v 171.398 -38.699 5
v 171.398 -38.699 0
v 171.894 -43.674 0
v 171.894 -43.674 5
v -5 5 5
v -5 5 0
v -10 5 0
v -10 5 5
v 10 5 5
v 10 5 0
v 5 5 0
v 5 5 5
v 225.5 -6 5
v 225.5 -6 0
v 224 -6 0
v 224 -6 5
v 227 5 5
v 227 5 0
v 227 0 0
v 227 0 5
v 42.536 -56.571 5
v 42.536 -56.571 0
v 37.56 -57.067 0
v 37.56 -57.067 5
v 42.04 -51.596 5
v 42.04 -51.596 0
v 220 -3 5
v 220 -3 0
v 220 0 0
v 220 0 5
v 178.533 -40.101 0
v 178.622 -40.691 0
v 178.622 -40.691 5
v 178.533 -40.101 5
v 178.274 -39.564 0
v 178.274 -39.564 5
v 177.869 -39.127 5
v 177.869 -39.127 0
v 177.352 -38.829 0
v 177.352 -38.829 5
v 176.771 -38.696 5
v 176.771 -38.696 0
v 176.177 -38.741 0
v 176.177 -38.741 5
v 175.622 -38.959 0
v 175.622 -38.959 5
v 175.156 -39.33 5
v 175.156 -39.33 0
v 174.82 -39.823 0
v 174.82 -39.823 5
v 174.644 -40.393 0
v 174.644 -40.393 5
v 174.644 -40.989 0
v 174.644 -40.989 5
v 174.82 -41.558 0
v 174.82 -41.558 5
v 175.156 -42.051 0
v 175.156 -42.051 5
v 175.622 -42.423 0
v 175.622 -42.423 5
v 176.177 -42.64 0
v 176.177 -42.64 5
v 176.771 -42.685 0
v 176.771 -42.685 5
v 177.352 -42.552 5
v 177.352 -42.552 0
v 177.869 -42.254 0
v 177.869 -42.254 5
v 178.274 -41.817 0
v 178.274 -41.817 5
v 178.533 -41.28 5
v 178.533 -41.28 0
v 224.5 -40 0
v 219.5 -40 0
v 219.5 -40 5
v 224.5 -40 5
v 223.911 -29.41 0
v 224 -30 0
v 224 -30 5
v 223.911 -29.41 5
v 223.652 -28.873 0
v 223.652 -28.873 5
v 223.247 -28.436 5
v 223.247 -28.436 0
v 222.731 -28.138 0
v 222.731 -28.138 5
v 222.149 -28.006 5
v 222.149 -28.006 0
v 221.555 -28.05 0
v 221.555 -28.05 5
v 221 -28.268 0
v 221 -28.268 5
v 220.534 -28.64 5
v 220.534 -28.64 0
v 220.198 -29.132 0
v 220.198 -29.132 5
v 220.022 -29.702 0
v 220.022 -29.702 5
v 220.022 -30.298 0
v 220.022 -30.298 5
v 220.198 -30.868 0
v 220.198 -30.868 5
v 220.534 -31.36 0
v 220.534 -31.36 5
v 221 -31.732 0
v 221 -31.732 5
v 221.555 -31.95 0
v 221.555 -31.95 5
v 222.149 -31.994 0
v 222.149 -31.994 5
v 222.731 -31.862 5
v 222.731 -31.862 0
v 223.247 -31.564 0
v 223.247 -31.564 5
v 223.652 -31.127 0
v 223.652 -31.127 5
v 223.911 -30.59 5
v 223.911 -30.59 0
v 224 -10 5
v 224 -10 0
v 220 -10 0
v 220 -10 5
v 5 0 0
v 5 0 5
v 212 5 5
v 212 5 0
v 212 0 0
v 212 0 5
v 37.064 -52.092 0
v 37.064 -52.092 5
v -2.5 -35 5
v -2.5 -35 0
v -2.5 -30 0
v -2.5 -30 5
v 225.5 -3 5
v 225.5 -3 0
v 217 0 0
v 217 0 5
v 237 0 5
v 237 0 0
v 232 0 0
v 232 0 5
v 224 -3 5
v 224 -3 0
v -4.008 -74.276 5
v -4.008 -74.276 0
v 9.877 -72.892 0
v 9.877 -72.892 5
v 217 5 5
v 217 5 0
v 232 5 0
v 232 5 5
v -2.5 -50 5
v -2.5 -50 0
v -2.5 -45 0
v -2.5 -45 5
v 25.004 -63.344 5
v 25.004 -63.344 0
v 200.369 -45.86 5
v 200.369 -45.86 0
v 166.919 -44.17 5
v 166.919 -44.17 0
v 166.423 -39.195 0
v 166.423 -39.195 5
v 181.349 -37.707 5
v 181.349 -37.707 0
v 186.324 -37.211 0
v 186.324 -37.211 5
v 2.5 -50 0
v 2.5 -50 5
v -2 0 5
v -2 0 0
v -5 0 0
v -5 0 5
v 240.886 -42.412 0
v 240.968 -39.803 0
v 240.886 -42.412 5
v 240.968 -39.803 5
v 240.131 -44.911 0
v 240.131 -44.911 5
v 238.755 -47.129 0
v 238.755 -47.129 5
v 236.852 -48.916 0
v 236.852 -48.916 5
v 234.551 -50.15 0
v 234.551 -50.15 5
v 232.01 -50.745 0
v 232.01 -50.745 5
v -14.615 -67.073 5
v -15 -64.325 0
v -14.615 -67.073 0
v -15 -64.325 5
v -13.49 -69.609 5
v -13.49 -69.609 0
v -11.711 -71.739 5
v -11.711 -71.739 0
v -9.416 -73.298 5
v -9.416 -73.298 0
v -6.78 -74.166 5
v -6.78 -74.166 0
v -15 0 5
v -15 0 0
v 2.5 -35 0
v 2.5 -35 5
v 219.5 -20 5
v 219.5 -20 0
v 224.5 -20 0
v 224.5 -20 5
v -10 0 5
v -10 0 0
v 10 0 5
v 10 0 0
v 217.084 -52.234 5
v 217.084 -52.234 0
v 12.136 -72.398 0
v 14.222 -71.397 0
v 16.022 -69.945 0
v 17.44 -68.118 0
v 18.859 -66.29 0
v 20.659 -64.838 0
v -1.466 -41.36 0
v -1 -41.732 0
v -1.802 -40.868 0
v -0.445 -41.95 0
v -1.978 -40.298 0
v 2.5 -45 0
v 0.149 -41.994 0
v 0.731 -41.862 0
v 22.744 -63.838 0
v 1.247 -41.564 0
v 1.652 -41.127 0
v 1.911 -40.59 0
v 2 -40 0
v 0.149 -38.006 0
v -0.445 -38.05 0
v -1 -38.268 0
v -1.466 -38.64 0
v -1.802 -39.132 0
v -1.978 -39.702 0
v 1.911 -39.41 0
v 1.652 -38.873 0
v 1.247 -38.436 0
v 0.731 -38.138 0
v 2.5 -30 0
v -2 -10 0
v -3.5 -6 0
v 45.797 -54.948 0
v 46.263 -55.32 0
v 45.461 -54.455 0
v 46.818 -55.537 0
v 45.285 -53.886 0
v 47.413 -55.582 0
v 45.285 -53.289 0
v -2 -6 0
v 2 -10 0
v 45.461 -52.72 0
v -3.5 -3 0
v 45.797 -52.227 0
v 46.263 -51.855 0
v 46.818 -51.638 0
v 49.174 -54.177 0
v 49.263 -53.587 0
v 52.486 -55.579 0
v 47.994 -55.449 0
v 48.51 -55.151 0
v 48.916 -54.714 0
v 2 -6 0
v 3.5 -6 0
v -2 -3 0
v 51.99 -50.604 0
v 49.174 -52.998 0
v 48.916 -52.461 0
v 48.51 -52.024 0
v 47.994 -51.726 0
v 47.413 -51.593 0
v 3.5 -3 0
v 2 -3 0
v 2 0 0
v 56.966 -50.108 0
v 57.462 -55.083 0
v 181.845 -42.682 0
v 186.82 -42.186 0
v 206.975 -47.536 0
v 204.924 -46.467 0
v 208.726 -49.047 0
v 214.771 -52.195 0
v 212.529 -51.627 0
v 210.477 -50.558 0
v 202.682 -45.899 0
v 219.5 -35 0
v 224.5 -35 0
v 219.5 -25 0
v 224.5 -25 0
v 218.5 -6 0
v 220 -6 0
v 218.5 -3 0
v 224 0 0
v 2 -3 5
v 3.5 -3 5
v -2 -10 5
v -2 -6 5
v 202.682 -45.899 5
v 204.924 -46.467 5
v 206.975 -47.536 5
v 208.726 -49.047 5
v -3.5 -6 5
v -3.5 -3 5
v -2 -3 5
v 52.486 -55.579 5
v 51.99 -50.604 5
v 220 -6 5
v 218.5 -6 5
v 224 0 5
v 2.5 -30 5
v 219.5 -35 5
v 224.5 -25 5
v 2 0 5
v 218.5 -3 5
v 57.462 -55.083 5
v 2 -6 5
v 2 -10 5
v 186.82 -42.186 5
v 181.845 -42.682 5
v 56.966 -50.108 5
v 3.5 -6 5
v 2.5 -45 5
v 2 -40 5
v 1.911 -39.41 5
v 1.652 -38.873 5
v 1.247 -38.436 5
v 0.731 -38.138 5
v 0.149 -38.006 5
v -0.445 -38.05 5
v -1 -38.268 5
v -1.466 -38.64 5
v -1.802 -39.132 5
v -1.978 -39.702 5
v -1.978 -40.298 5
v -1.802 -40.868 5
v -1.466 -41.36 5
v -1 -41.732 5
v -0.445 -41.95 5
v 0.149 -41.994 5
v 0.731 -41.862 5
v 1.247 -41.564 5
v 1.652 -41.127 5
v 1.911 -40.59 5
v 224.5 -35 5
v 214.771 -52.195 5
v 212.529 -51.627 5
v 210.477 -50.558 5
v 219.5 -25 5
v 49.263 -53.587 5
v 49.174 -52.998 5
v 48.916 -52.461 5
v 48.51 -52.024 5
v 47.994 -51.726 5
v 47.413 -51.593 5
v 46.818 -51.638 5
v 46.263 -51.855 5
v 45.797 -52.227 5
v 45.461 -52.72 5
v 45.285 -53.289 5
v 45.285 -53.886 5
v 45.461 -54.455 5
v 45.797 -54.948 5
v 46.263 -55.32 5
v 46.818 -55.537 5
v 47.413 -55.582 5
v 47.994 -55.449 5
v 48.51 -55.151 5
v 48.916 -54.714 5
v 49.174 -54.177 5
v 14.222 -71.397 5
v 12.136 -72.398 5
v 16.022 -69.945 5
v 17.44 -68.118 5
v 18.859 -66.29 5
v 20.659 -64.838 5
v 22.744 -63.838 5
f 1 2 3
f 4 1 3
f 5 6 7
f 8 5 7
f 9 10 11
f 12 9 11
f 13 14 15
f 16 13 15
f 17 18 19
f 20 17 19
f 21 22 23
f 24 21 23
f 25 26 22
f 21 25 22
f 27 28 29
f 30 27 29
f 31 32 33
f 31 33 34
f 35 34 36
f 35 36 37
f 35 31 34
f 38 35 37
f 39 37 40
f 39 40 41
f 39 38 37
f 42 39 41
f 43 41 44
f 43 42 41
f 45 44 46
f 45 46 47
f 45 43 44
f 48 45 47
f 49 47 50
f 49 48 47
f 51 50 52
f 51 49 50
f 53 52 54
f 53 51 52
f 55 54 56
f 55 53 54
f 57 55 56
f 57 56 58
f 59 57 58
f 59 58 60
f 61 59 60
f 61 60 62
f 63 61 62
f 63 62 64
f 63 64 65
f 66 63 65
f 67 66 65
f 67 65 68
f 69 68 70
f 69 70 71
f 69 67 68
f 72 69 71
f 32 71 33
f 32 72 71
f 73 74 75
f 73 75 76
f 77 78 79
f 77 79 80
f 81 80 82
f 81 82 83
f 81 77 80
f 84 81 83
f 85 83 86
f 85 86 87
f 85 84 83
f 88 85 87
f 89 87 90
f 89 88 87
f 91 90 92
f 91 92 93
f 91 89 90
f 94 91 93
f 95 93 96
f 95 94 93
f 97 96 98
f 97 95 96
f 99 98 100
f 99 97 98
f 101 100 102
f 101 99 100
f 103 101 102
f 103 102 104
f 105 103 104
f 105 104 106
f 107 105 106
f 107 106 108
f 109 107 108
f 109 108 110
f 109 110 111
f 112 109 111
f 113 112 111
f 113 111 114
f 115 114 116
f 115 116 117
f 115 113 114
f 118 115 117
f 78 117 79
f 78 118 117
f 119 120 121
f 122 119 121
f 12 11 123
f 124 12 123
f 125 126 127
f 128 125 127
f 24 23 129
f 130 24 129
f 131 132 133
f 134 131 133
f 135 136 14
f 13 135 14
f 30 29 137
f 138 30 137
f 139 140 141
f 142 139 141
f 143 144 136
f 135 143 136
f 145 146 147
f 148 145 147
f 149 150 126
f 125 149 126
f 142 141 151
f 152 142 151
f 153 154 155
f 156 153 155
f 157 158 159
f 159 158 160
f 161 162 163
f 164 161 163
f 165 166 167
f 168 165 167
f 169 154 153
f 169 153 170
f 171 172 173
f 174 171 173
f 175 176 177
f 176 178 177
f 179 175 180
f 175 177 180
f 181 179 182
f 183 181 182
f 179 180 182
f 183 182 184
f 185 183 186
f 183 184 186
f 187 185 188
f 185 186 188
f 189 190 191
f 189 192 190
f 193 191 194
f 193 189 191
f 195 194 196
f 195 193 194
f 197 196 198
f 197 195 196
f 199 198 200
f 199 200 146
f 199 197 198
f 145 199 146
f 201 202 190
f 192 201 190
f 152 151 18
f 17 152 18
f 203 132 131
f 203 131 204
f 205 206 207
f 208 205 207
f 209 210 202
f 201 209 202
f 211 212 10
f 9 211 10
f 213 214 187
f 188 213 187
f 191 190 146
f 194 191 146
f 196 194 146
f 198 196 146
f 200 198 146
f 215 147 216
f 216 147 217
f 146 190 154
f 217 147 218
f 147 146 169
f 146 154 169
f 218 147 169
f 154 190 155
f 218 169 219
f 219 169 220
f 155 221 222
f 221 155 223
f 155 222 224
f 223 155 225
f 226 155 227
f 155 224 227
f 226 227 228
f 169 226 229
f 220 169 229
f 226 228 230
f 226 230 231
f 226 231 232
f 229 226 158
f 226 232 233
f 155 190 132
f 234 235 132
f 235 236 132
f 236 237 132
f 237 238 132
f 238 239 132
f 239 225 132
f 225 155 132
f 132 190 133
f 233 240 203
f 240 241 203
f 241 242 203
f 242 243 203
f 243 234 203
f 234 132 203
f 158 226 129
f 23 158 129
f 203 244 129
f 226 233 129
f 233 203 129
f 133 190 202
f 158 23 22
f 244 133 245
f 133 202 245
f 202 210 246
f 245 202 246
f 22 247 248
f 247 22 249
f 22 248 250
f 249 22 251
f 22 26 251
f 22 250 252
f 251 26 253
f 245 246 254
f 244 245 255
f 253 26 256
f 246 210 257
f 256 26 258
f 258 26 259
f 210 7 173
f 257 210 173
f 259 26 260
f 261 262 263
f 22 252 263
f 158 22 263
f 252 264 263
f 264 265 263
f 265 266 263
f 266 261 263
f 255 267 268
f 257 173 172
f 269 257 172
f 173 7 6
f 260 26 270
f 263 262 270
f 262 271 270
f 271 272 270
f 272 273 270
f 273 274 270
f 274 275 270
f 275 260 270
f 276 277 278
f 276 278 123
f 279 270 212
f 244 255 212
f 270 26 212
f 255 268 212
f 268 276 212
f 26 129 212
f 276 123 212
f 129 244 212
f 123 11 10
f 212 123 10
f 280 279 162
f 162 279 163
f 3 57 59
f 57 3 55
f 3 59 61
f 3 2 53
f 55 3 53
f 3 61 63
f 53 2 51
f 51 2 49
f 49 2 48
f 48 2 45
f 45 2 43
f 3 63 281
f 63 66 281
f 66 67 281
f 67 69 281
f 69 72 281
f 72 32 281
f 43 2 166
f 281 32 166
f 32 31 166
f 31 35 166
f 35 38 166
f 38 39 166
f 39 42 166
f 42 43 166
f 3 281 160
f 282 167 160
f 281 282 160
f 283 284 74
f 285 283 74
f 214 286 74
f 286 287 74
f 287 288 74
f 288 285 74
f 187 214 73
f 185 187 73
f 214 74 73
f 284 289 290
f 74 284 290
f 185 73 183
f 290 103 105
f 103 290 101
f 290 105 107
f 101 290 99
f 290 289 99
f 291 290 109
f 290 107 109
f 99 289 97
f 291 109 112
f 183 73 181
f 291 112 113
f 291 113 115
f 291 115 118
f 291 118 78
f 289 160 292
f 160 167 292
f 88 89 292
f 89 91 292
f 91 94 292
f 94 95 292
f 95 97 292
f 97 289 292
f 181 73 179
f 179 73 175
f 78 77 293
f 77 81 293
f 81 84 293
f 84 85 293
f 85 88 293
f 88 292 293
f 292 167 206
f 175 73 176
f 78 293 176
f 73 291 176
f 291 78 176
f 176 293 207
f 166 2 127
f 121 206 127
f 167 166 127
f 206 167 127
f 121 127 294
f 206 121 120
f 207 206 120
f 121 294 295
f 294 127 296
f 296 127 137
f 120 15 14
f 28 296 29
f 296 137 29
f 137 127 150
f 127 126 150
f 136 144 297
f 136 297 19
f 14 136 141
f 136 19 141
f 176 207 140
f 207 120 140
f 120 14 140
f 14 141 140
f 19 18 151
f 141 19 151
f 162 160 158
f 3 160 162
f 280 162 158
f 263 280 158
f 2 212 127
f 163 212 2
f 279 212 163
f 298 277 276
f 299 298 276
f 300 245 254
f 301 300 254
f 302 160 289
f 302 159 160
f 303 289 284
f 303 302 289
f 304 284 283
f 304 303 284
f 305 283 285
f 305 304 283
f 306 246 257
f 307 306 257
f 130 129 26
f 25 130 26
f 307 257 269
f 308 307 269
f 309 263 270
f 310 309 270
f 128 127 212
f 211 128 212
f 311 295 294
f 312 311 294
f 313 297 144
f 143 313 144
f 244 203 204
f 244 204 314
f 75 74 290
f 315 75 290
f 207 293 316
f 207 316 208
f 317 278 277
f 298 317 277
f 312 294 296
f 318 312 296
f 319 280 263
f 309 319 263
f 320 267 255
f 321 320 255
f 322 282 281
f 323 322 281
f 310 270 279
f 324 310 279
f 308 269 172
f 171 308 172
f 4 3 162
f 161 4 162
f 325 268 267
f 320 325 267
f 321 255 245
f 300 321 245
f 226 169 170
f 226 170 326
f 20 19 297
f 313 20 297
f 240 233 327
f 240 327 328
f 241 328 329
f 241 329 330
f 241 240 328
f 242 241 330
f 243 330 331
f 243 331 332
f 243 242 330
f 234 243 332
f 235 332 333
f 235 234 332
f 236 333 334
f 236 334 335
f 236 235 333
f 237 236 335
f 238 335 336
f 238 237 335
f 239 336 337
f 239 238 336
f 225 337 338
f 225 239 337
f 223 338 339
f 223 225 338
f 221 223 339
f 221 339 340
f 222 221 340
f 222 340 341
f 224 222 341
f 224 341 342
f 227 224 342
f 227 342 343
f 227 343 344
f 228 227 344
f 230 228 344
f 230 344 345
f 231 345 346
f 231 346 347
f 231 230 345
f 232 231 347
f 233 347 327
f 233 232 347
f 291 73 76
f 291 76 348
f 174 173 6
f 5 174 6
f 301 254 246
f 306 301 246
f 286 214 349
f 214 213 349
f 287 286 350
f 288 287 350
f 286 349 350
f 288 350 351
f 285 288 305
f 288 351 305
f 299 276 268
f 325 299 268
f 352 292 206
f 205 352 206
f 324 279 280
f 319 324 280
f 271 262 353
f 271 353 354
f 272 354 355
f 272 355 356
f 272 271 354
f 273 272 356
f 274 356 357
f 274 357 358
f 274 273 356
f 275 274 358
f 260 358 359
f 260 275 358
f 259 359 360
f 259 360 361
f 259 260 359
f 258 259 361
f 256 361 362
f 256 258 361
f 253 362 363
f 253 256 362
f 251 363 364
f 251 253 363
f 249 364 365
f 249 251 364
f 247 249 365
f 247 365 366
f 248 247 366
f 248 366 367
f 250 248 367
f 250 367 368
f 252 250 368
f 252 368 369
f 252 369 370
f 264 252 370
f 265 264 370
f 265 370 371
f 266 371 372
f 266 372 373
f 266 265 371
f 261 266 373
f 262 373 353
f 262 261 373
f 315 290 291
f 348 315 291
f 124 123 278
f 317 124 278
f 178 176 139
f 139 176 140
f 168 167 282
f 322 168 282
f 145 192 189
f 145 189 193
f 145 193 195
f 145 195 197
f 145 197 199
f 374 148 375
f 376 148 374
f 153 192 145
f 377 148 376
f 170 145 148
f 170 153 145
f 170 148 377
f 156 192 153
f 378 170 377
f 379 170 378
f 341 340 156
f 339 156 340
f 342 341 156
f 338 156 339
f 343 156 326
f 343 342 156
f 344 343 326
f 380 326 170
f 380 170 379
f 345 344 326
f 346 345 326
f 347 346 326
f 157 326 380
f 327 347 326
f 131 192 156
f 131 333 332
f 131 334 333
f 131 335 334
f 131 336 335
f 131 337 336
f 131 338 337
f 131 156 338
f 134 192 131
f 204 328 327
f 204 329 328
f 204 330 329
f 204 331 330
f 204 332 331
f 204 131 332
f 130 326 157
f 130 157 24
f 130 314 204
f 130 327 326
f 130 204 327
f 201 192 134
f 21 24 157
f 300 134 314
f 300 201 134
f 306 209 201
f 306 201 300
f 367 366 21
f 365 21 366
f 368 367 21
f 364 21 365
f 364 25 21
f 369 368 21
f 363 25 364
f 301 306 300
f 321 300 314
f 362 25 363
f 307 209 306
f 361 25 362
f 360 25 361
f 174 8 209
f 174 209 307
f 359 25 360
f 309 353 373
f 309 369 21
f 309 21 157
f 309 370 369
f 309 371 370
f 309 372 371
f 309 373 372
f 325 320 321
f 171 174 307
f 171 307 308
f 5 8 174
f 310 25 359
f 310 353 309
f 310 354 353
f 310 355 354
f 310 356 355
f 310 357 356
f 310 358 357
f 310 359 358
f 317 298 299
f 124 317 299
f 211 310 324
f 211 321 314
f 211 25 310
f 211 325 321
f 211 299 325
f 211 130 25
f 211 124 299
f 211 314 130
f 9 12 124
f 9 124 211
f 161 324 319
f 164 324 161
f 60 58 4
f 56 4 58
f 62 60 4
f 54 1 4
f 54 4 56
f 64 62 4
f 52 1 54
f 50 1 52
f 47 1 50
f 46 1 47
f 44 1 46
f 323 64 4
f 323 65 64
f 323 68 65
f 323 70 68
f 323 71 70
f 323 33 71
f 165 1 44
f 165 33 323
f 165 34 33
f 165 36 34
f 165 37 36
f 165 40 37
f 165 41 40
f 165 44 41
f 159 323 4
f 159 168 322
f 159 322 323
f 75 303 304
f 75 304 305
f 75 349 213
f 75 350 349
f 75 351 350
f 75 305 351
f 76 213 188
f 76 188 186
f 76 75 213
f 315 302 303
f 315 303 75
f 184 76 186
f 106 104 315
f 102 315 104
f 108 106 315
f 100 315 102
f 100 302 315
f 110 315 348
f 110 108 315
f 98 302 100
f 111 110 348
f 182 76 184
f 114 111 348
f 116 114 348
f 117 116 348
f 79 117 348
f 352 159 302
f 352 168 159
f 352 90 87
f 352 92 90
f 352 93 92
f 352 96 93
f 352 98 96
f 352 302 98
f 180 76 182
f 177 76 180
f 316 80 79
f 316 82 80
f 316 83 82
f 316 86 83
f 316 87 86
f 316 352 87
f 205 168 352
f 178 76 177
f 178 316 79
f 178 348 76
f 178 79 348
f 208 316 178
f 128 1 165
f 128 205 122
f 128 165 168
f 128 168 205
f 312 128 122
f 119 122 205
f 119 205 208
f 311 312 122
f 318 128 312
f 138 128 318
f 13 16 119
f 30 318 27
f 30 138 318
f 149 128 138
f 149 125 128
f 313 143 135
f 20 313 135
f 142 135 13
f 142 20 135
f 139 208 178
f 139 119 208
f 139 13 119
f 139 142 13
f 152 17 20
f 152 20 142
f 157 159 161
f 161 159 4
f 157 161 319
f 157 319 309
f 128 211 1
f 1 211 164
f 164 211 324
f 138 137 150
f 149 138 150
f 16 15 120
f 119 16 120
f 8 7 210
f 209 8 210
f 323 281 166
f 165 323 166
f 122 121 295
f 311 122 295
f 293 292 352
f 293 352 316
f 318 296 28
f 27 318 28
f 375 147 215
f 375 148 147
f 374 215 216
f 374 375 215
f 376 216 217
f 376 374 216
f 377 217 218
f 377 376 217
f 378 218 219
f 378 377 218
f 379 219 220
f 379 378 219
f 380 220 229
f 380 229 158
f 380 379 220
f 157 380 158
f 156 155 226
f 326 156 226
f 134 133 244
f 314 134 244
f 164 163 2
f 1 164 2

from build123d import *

# Parameters (mm, degrees)
ESQUISSE1_W        = 5
ESQUISSE1_H        = 5
ESQUISSE1_R        = 2
BOSS_EXTRU_1_DEPTH = 5
CONG_1_R           = 10


with BuildPart() as part:
    # Esquisse1 → Boss.-Extru.1 (new body)
    with BuildSketch(Plane.XY):
        Polygon((15, 0), (10, 0), (10, 5), (5, 5), (5, 0), (2, 0), (2, -3), (3.5, -3), (3.5, -6), (2, -6), (2, -10), (-2, -10), (-2, -6), (-3.5, -6), (-3.5, -3), (-2, -3), (-2, 0), (-5, 0), (-5, 5), (-10, 5), (-10, 0), (-15, 0), (-15, -75.371818049), (14.852006469, -72.395627572), (20.02875697, -63.839854419), (205.344258903, -45.364237629), (212.108310991, -52.729534592), (241.96031746, -49.753344116), (237, 0), (232, 0), (232, 5), (227, 5), (227, 0), (224, 0), (224, -3), (225.5, -3), (225.5, -6), (224, -6), (224, -10), (220, -10), (220, -6), (218.5, -6), (218.5, -3), (220, -3), (220, 0), (217, 0), (217, 5), (212, 5), (212, 0), (207, 0), align=None)
        with Locations((0, -47.5)):
            Rectangle(ESQUISSE1_W, ESQUISSE1_H, mode=Mode.SUBTRACT)
        Polygon((42.039762682, -51.595821645), (42.535794429, -56.571156057), (37.560460017, -57.067187803), (37.064428271, -52.091853391), align=None, mode=Mode.SUBTRACT)
        with Locations((47.263112967, -53.587457105)):
            Circle(ESQUISSE1_R, mode=Mode.SUBTRACT)
        with Locations((0, -40)):
            Circle(ESQUISSE1_R, mode=Mode.SUBTRACT)
        Polygon((57.461797663, -55.083060818), (52.486463252, -55.579092564), (51.990431506, -50.603758153), (56.965765917, -50.107726407), align=None, mode=Mode.SUBTRACT)
        Polygon((171.398457383, -38.698996248), (171.894489129, -43.67433066), (166.919154718, -44.170362406), (166.423122972, -39.195027994), align=None, mode=Mode.SUBTRACT)
        with Locations((176.621807668, -40.690631708)):
            Circle(ESQUISSE1_R, mode=Mode.SUBTRACT)
        Polygon((186.820492364, -42.186235422), (181.845157952, -42.682267168), (181.349126206, -37.706932756), (186.324460618, -37.21090101), align=None, mode=Mode.SUBTRACT)
        with Locations((222, -37.5)):
            Rectangle(ESQUISSE1_W, ESQUISSE1_H, mode=Mode.SUBTRACT)
        with Locations((0, -32.5)):
            Rectangle(ESQUISSE1_W, ESQUISSE1_H, mode=Mode.SUBTRACT)
        with Locations((222, -30)):
            Circle(ESQUISSE1_R, mode=Mode.SUBTRACT)
        with Locations((222, -22.5)):
            Rectangle(ESQUISSE1_W, ESQUISSE1_H, mode=Mode.SUBTRACT)
    extrude(amount=BOSS_EXTRU_1_DEPTH)

    # Congé1
    cong_1_edges = [part.edges().sort_by_distance(p)[0] for p in [
        (241.96031746, -49.753344116, 2.5),
        (205.344258903, -45.364237629, 2.5),
        (212.108310991, -52.729534592, 2.5),
        (-15, -75.371818049, 2.5),
        (20.02875697, -63.839854419, 2.5),
        (14.852006469, -72.395627572, 2.5),
    ]]
    fillet(cong_1_edges, radius=CONG_1_R - 0.0001)  # a hair under: the kernel refuses the full size


solid = part.part
